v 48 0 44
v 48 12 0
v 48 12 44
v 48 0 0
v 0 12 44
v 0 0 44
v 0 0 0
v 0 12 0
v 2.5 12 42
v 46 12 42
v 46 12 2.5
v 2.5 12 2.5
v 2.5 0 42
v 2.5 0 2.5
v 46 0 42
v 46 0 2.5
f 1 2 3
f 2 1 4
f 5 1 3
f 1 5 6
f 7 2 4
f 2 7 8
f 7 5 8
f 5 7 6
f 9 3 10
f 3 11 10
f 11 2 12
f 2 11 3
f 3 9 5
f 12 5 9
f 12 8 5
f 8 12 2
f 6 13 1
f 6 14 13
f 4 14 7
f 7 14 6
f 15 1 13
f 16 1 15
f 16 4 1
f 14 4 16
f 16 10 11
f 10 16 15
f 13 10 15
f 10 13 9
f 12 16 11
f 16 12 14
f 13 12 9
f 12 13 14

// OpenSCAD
//Variables
cube_design = 1;
grid_pattern = "squares"; //squares, squares2 (rotated by 45°)
plexi_cube_width = 39; //39 for cube1, 32 for cube2
plexi_cube_length = 35; //35 for cube1, 30 for cube2
plexi_cube_depth_overall = 30;
darkener_overhang = 10;
plexi_cube_depth = 20; //this is for the main corpus
plexi_cube_thickness = 2;
plexi_cube_buffer = 0.5; //1mm room in every direction
insert_bar_height = 6; //needs to be the same as in the insert creator
insert_bar_length = 16; //needs to be the same as in the insert creator
insert_base_length = 28; //needs to be the same as "base plate length upper" in the insert creator
insert_thickness = 2; //needs to be the same as "base plate thickness" in the insert creator
insert_buffer = 1;
insert_distance_from_tube_end = 4;

tube_thickness = 2;

tube_width = 28;
tube_length = 28;
tube_depth = 25.5; // was 38.5
tube_count = 3; //number of tubes

security_bar_width = 4;

slide_bar_length = tube_depth+2;
slide_bar_width = 1.6; //decreased from 2 to 1,6 for buffer
slide_bar_height = 2;
//if square grid pattern

square_width = 5;
square_length = 4;
square_distance = 2;
number_squares_per_row = 4;
number_squares_per_column = 2;

//angle
tube_distance_left = (plexi_cube_width/2+plexi_cube_buffer+plexi_cube_thickness-tube_width/2-tube_thickness);
tube_distance_bottom = (plexi_cube_length/2+plexi_cube_buffer+plexi_cube_thickness-tube_length/2-tube_thickness);
angle_depth = max(tube_distance_left, tube_distance_bottom);
outer_cube_width = plexi_cube_width + 2*plexi_cube_thickness + 2*plexi_cube_buffer;
outer_cube_length = plexi_cube_length + 2*plexi_cube_thickness + 2*plexi_cube_buffer;

//module to show points of a polyhedron
module showPoints(v) {
    for (i = [0: len(v)-1]) {
        translate(v[i]) color("red") 
        text(str(i), font = "Courier New", size=1.5);
         
    }
}

//module to create a square grid pattern
module square_grid(){
    grid_width = square_width*number_squares_per_row + square_distance*(number_squares_per_row-1);
    grid_length = square_length*number_squares_per_column + square_distance*(number_squares_per_column-1);
translate([tube_width/2+tube_thickness-grid_width/2,tube_depth+angle_depth-(insert_distance_from_tube_end+insert_thickness+insert_buffer+insert_bar_height)+3,0])
translate([grid_width,0,0])
rotate([0,0,180])
for (j=[0:number_squares_per_column-1]){
for (i=[0:number_squares_per_row-1]){
    translate([i*(square_distance+square_width),j*(square_distance+square_length),0])cube([square_width,square_length,tube_thickness]);
    }
}
}

module square_grid2(){
    grid_width = square_width*number_squares_per_row + square_distance*(number_squares_per_row-1);
    grid_length = square_length*number_squares_per_column + square_distance*(number_squares_per_column-1);
translate([tube_width/2+tube_thickness-grid_width/2,tube_depth+angle_depth-(insert_distance_from_tube_end+insert_thickness+insert_buffer+insert_bar_height),0])
translate([grid_width-square_length/2,0,0])
rotate([0,0,180])
for (j=[0:number_squares_per_column-1]){
for (i=[0:number_squares_per_row-1]){
    translate([i*(square_distance+square_width),j*(square_distance+square_length),0])rotate([0,0,45])cube([square_width,square_length,tube_thickness]);
    }
}
}


//Complete Corpus
*union(){

//plexi_cube part of the tube
difference(){
    cube([plexi_cube_width + 2*plexi_cube_thickness + 2*plexi_cube_buffer, plexi_cube_depth, plexi_cube_length+2*plexi_cube_thickness + 2*plexi_cube_buffer]);
    translate([plexi_cube_thickness,0,plexi_cube_thickness])cube([plexi_cube_width + 2*plexi_cube_buffer, plexi_cube_depth, plexi_cube_length + 2*plexi_cube_buffer]);
}

//angle
angle_points = [
    [0,0,0], //0
    [outer_cube_width,0,0],//1
    [outer_cube_width,0,outer_cube_length],//2
    [0,0,outer_cube_length],//3
    [tube_distance_left,0,tube_distance_bottom],//4
    [outer_cube_width-tube_distance_left,0,tube_distance_bottom],//5
    [outer_cube_width-tube_distance_left,0,outer_cube_length-tube_distance_bottom],//6
    [tube_distance_left,0,outer_cube_length-tube_distance_bottom],//7
    [tube_distance_left,angle_depth,tube_distance_bottom],//8
    [outer_cube_width-tube_distance_left,angle_depth,tube_distance_bottom],//9
    [outer_cube_width-tube_distance_left,angle_depth,outer_cube_length-tube_distance_bottom],//10
    [tube_distance_left,angle_depth,outer_cube_length-tube_distance_bottom],//11
    
];

*showPoints(angle_points);
angle_faces = [
    [1,0,4,5],
    [0,1,9,8],
    [5,4,8,9],
    [2,1,5,6],
    [1,2,10,9],
    [6,5,9,10],
    [3,2,6,7],
    [2,3,11,10],
    [7,6,10,11],
    [0,3,7,4],
    [3,0,8,11],
    [4,7,11,8],
];


translate([0,plexi_cube_depth,0])
polyhedron(angle_points, angle_faces);



//tube
translate([plexi_cube_width/2-tube_width/2 + plexi_cube_buffer,plexi_cube_depth ,plexi_cube_length/2-tube_length/2 + plexi_cube_buffer]) 
for(i=[0:tube_count-1]){
if (i==0){
translate([0,tube_depth*i,0])    
union(){
difference(){
    cube([tube_width+2*tube_thickness, tube_depth + angle_depth, tube_length + 2*tube_thickness]);
    translate([tube_thickness,0,tube_thickness])cube([tube_width, tube_depth + angle_depth, tube_length]);
    

insert_slot_upper_points = [
    [0,0,0], //0
    [insert_base_length,0,0],//1
    [insert_base_length,insert_thickness + insert_buffer, 0],//2
    [insert_base_length/2 + insert_bar_length/2,insert_thickness + insert_buffer + insert_bar_height,0],//3
    [insert_base_length/2 - insert_bar_length/2,insert_thickness + insert_buffer + insert_bar_height,0],//4
    [0,insert_thickness + insert_buffer, 0],//5
    [0,0,tube_thickness], //6
    [insert_base_length,0,tube_thickness],//7
    [insert_base_length,insert_thickness + insert_buffer, tube_thickness],//8
    [insert_base_length/2 + insert_bar_length/2,insert_thickness + insert_buffer + insert_bar_height,tube_thickness],//9
    [insert_base_length/2 - insert_bar_length/2,insert_thickness + insert_buffer + insert_bar_height,tube_thickness],//10
    [0,insert_thickness + insert_buffer, tube_thickness],//11
];

*showPoints(insert_slot_upper_points);

insert_slot_upper_faces = [
    [0,1,2,3,4,5],
    [0,5,11,6],
    [5,4,10,11],
    [4,3,9,10],
    [3,2,8,9],
    [2,1,7,8],
    [1,0,6,7],
    [11,10,9,8,7,6]
];

translate([tube_width/2+tube_thickness-insert_base_length/2,tube_depth+angle_depth-(insert_bar_height+insert_thickness+insert_buffer)-insert_distance_from_tube_end,tube_length+tube_thickness])translate([insert_base_length,insert_bar_height + insert_thickness + insert_buffer,0])rotate([0,0,180])polyhedron(insert_slot_upper_points,insert_slot_upper_faces);

translate([tube_width/2+tube_thickness-insert_base_length/2,tube_depth+angle_depth-(insert_thickness+insert_buffer)-insert_distance_from_tube_end,0])cube([insert_base_length,insert_thickness+insert_buffer,tube_thickness]);


if (grid_pattern == "squares") square_grid();
else if (grid_pattern == "squares2") square_grid2();   
    
}
translate([tube_thickness,tube_depth+angle_depth-insert_distance_from_tube_end,tube_thickness])cube([security_bar_width,insert_distance_from_tube_end,tube_length]);
translate([tube_width-tube_thickness,tube_depth+angle_depth-insert_distance_from_tube_end,tube_thickness])cube([security_bar_width,insert_distance_from_tube_end,tube_length]);
translate([-slide_bar_width,tube_depth+angle_depth-slide_bar_length,0])
color("red"){cube([slide_bar_width,slide_bar_length,slide_bar_height]); 
;
}
translate([tube_width+2*tube_thickness,tube_depth+angle_depth-slide_bar_length,0])
color("red"){cube([slide_bar_width,slide_bar_length,slide_bar_height]); 

}
}
}
else{
translate([0,tube_depth*i,0])    
union(){
difference(){
    translate([0,angle_depth,0])
    cube([tube_width+2*tube_thickness, tube_depth , tube_length + 2*tube_thickness]);
    translate([tube_thickness,0,tube_thickness])cube([tube_width, tube_depth + angle_depth, tube_length]);
    

insert_slot_upper_points = [
    [0,0,0], //0
    [insert_base_length,0,0],//1
    [insert_base_length,insert_thickness + insert_buffer, 0],//2
    [insert_base_length/2 + insert_bar_length/2,insert_thickness + insert_buffer + insert_bar_height,0],//3
    [insert_base_length/2 - insert_bar_length/2,insert_thickness + insert_buffer + insert_bar_height,0],//4
    [0,insert_thickness + insert_buffer, 0],//5
    [0,0,tube_thickness], //6
    [insert_base_length,0,tube_thickness],//7
    [insert_base_length,insert_thickness + insert_buffer, tube_thickness],//8
    [insert_base_length/2 + insert_bar_length/2,insert_thickness + insert_buffer + insert_bar_height,tube_thickness],//9
    [insert_base_length/2 - insert_bar_length/2,insert_thickness + insert_buffer + insert_bar_height,tube_thickness],//10
    [0,insert_thickness + insert_buffer, tube_thickness],//11
];

*showPoints(insert_slot_upper_points);

insert_slot_upper_faces = [
    [0,1,2,3,4,5],
    [0,5,11,6],
    [5,4,10,11],
    [4,3,9,10],
    [3,2,8,9],
    [2,1,7,8],
    [1,0,6,7],
    [11,10,9,8,7,6]
];

translate([tube_width/2+tube_thickness-insert_base_length/2,tube_depth+angle_depth-(insert_bar_height+insert_thickness+insert_buffer)-insert_distance_from_tube_end,tube_length+tube_thickness])translate([insert_base_length,insert_bar_height + insert_thickness + insert_buffer,0])rotate([0,0,180])polyhedron(insert_slot_upper_points,insert_slot_upper_faces);

translate([tube_width/2+tube_thickness-insert_base_length/2,tube_depth+angle_depth-(insert_thickness+insert_buffer)-insert_distance_from_tube_end,0])cube([insert_base_length,insert_thickness+insert_buffer,tube_thickness]);


if (grid_pattern == "squares") square_grid();
else if (grid_pattern == "squares2") square_grid2();   
    
}
translate([tube_thickness,tube_depth+angle_depth-insert_distance_from_tube_end,tube_thickness])cube([security_bar_width,insert_distance_from_tube_end,tube_length]);
translate([tube_width-tube_thickness,tube_depth+angle_depth-insert_distance_from_tube_end,tube_thickness])cube([security_bar_width,insert_distance_from_tube_end,tube_length]);
translate([-slide_bar_width,tube_depth+angle_depth-slide_bar_length,0])
color("red"){cube([slide_bar_width,slide_bar_length,slide_bar_height]); 
;
}
translate([tube_width+2*tube_thickness,tube_depth+angle_depth-slide_bar_length,0])
color("red"){cube([slide_bar_width,slide_bar_length,slide_bar_height]); 

}
}
}
}
}

// funnel

// darkener
*difference(){
cube([plexi_cube_width+2*plexi_cube_thickness+2*plexi_cube_buffer,plexi_cube_depth_overall-plexi_cube_depth+plexi_cube_thickness,plexi_cube_length+2*plexi_cube_thickness+2*plexi_cube_buffer]);
translate([plexi_cube_thickness+plexi_cube_buffer,plexi_cube_thickness,plexi_cube_thickness+plexi_cube_buffer])cube([plexi_cube_width+2*plexi_cube_buffer,plexi_cube_depth_overall-plexi_cube_depth,plexi_cube_length+2*plexi_cube_buffer]);
}
difference(){
cube([plexi_cube_width+4*plexi_cube_thickness+2*plexi_cube_buffer,darkener_overhang+plexi_cube_thickness,plexi_cube_length+4*plexi_cube_thickness+2*plexi_cube_buffer]);
translate([plexi_cube_thickness+plexi_cube_buffer,0,plexi_cube_thickness+plexi_cube_buffer])cube([plexi_cube_width+2*plexi_cube_thickness+plexi_cube_buffer,darkener_overhang+plexi_cube_thickness,plexi_cube_length+2*plexi_cube_thickness+plexi_cube_buffer]);
}
